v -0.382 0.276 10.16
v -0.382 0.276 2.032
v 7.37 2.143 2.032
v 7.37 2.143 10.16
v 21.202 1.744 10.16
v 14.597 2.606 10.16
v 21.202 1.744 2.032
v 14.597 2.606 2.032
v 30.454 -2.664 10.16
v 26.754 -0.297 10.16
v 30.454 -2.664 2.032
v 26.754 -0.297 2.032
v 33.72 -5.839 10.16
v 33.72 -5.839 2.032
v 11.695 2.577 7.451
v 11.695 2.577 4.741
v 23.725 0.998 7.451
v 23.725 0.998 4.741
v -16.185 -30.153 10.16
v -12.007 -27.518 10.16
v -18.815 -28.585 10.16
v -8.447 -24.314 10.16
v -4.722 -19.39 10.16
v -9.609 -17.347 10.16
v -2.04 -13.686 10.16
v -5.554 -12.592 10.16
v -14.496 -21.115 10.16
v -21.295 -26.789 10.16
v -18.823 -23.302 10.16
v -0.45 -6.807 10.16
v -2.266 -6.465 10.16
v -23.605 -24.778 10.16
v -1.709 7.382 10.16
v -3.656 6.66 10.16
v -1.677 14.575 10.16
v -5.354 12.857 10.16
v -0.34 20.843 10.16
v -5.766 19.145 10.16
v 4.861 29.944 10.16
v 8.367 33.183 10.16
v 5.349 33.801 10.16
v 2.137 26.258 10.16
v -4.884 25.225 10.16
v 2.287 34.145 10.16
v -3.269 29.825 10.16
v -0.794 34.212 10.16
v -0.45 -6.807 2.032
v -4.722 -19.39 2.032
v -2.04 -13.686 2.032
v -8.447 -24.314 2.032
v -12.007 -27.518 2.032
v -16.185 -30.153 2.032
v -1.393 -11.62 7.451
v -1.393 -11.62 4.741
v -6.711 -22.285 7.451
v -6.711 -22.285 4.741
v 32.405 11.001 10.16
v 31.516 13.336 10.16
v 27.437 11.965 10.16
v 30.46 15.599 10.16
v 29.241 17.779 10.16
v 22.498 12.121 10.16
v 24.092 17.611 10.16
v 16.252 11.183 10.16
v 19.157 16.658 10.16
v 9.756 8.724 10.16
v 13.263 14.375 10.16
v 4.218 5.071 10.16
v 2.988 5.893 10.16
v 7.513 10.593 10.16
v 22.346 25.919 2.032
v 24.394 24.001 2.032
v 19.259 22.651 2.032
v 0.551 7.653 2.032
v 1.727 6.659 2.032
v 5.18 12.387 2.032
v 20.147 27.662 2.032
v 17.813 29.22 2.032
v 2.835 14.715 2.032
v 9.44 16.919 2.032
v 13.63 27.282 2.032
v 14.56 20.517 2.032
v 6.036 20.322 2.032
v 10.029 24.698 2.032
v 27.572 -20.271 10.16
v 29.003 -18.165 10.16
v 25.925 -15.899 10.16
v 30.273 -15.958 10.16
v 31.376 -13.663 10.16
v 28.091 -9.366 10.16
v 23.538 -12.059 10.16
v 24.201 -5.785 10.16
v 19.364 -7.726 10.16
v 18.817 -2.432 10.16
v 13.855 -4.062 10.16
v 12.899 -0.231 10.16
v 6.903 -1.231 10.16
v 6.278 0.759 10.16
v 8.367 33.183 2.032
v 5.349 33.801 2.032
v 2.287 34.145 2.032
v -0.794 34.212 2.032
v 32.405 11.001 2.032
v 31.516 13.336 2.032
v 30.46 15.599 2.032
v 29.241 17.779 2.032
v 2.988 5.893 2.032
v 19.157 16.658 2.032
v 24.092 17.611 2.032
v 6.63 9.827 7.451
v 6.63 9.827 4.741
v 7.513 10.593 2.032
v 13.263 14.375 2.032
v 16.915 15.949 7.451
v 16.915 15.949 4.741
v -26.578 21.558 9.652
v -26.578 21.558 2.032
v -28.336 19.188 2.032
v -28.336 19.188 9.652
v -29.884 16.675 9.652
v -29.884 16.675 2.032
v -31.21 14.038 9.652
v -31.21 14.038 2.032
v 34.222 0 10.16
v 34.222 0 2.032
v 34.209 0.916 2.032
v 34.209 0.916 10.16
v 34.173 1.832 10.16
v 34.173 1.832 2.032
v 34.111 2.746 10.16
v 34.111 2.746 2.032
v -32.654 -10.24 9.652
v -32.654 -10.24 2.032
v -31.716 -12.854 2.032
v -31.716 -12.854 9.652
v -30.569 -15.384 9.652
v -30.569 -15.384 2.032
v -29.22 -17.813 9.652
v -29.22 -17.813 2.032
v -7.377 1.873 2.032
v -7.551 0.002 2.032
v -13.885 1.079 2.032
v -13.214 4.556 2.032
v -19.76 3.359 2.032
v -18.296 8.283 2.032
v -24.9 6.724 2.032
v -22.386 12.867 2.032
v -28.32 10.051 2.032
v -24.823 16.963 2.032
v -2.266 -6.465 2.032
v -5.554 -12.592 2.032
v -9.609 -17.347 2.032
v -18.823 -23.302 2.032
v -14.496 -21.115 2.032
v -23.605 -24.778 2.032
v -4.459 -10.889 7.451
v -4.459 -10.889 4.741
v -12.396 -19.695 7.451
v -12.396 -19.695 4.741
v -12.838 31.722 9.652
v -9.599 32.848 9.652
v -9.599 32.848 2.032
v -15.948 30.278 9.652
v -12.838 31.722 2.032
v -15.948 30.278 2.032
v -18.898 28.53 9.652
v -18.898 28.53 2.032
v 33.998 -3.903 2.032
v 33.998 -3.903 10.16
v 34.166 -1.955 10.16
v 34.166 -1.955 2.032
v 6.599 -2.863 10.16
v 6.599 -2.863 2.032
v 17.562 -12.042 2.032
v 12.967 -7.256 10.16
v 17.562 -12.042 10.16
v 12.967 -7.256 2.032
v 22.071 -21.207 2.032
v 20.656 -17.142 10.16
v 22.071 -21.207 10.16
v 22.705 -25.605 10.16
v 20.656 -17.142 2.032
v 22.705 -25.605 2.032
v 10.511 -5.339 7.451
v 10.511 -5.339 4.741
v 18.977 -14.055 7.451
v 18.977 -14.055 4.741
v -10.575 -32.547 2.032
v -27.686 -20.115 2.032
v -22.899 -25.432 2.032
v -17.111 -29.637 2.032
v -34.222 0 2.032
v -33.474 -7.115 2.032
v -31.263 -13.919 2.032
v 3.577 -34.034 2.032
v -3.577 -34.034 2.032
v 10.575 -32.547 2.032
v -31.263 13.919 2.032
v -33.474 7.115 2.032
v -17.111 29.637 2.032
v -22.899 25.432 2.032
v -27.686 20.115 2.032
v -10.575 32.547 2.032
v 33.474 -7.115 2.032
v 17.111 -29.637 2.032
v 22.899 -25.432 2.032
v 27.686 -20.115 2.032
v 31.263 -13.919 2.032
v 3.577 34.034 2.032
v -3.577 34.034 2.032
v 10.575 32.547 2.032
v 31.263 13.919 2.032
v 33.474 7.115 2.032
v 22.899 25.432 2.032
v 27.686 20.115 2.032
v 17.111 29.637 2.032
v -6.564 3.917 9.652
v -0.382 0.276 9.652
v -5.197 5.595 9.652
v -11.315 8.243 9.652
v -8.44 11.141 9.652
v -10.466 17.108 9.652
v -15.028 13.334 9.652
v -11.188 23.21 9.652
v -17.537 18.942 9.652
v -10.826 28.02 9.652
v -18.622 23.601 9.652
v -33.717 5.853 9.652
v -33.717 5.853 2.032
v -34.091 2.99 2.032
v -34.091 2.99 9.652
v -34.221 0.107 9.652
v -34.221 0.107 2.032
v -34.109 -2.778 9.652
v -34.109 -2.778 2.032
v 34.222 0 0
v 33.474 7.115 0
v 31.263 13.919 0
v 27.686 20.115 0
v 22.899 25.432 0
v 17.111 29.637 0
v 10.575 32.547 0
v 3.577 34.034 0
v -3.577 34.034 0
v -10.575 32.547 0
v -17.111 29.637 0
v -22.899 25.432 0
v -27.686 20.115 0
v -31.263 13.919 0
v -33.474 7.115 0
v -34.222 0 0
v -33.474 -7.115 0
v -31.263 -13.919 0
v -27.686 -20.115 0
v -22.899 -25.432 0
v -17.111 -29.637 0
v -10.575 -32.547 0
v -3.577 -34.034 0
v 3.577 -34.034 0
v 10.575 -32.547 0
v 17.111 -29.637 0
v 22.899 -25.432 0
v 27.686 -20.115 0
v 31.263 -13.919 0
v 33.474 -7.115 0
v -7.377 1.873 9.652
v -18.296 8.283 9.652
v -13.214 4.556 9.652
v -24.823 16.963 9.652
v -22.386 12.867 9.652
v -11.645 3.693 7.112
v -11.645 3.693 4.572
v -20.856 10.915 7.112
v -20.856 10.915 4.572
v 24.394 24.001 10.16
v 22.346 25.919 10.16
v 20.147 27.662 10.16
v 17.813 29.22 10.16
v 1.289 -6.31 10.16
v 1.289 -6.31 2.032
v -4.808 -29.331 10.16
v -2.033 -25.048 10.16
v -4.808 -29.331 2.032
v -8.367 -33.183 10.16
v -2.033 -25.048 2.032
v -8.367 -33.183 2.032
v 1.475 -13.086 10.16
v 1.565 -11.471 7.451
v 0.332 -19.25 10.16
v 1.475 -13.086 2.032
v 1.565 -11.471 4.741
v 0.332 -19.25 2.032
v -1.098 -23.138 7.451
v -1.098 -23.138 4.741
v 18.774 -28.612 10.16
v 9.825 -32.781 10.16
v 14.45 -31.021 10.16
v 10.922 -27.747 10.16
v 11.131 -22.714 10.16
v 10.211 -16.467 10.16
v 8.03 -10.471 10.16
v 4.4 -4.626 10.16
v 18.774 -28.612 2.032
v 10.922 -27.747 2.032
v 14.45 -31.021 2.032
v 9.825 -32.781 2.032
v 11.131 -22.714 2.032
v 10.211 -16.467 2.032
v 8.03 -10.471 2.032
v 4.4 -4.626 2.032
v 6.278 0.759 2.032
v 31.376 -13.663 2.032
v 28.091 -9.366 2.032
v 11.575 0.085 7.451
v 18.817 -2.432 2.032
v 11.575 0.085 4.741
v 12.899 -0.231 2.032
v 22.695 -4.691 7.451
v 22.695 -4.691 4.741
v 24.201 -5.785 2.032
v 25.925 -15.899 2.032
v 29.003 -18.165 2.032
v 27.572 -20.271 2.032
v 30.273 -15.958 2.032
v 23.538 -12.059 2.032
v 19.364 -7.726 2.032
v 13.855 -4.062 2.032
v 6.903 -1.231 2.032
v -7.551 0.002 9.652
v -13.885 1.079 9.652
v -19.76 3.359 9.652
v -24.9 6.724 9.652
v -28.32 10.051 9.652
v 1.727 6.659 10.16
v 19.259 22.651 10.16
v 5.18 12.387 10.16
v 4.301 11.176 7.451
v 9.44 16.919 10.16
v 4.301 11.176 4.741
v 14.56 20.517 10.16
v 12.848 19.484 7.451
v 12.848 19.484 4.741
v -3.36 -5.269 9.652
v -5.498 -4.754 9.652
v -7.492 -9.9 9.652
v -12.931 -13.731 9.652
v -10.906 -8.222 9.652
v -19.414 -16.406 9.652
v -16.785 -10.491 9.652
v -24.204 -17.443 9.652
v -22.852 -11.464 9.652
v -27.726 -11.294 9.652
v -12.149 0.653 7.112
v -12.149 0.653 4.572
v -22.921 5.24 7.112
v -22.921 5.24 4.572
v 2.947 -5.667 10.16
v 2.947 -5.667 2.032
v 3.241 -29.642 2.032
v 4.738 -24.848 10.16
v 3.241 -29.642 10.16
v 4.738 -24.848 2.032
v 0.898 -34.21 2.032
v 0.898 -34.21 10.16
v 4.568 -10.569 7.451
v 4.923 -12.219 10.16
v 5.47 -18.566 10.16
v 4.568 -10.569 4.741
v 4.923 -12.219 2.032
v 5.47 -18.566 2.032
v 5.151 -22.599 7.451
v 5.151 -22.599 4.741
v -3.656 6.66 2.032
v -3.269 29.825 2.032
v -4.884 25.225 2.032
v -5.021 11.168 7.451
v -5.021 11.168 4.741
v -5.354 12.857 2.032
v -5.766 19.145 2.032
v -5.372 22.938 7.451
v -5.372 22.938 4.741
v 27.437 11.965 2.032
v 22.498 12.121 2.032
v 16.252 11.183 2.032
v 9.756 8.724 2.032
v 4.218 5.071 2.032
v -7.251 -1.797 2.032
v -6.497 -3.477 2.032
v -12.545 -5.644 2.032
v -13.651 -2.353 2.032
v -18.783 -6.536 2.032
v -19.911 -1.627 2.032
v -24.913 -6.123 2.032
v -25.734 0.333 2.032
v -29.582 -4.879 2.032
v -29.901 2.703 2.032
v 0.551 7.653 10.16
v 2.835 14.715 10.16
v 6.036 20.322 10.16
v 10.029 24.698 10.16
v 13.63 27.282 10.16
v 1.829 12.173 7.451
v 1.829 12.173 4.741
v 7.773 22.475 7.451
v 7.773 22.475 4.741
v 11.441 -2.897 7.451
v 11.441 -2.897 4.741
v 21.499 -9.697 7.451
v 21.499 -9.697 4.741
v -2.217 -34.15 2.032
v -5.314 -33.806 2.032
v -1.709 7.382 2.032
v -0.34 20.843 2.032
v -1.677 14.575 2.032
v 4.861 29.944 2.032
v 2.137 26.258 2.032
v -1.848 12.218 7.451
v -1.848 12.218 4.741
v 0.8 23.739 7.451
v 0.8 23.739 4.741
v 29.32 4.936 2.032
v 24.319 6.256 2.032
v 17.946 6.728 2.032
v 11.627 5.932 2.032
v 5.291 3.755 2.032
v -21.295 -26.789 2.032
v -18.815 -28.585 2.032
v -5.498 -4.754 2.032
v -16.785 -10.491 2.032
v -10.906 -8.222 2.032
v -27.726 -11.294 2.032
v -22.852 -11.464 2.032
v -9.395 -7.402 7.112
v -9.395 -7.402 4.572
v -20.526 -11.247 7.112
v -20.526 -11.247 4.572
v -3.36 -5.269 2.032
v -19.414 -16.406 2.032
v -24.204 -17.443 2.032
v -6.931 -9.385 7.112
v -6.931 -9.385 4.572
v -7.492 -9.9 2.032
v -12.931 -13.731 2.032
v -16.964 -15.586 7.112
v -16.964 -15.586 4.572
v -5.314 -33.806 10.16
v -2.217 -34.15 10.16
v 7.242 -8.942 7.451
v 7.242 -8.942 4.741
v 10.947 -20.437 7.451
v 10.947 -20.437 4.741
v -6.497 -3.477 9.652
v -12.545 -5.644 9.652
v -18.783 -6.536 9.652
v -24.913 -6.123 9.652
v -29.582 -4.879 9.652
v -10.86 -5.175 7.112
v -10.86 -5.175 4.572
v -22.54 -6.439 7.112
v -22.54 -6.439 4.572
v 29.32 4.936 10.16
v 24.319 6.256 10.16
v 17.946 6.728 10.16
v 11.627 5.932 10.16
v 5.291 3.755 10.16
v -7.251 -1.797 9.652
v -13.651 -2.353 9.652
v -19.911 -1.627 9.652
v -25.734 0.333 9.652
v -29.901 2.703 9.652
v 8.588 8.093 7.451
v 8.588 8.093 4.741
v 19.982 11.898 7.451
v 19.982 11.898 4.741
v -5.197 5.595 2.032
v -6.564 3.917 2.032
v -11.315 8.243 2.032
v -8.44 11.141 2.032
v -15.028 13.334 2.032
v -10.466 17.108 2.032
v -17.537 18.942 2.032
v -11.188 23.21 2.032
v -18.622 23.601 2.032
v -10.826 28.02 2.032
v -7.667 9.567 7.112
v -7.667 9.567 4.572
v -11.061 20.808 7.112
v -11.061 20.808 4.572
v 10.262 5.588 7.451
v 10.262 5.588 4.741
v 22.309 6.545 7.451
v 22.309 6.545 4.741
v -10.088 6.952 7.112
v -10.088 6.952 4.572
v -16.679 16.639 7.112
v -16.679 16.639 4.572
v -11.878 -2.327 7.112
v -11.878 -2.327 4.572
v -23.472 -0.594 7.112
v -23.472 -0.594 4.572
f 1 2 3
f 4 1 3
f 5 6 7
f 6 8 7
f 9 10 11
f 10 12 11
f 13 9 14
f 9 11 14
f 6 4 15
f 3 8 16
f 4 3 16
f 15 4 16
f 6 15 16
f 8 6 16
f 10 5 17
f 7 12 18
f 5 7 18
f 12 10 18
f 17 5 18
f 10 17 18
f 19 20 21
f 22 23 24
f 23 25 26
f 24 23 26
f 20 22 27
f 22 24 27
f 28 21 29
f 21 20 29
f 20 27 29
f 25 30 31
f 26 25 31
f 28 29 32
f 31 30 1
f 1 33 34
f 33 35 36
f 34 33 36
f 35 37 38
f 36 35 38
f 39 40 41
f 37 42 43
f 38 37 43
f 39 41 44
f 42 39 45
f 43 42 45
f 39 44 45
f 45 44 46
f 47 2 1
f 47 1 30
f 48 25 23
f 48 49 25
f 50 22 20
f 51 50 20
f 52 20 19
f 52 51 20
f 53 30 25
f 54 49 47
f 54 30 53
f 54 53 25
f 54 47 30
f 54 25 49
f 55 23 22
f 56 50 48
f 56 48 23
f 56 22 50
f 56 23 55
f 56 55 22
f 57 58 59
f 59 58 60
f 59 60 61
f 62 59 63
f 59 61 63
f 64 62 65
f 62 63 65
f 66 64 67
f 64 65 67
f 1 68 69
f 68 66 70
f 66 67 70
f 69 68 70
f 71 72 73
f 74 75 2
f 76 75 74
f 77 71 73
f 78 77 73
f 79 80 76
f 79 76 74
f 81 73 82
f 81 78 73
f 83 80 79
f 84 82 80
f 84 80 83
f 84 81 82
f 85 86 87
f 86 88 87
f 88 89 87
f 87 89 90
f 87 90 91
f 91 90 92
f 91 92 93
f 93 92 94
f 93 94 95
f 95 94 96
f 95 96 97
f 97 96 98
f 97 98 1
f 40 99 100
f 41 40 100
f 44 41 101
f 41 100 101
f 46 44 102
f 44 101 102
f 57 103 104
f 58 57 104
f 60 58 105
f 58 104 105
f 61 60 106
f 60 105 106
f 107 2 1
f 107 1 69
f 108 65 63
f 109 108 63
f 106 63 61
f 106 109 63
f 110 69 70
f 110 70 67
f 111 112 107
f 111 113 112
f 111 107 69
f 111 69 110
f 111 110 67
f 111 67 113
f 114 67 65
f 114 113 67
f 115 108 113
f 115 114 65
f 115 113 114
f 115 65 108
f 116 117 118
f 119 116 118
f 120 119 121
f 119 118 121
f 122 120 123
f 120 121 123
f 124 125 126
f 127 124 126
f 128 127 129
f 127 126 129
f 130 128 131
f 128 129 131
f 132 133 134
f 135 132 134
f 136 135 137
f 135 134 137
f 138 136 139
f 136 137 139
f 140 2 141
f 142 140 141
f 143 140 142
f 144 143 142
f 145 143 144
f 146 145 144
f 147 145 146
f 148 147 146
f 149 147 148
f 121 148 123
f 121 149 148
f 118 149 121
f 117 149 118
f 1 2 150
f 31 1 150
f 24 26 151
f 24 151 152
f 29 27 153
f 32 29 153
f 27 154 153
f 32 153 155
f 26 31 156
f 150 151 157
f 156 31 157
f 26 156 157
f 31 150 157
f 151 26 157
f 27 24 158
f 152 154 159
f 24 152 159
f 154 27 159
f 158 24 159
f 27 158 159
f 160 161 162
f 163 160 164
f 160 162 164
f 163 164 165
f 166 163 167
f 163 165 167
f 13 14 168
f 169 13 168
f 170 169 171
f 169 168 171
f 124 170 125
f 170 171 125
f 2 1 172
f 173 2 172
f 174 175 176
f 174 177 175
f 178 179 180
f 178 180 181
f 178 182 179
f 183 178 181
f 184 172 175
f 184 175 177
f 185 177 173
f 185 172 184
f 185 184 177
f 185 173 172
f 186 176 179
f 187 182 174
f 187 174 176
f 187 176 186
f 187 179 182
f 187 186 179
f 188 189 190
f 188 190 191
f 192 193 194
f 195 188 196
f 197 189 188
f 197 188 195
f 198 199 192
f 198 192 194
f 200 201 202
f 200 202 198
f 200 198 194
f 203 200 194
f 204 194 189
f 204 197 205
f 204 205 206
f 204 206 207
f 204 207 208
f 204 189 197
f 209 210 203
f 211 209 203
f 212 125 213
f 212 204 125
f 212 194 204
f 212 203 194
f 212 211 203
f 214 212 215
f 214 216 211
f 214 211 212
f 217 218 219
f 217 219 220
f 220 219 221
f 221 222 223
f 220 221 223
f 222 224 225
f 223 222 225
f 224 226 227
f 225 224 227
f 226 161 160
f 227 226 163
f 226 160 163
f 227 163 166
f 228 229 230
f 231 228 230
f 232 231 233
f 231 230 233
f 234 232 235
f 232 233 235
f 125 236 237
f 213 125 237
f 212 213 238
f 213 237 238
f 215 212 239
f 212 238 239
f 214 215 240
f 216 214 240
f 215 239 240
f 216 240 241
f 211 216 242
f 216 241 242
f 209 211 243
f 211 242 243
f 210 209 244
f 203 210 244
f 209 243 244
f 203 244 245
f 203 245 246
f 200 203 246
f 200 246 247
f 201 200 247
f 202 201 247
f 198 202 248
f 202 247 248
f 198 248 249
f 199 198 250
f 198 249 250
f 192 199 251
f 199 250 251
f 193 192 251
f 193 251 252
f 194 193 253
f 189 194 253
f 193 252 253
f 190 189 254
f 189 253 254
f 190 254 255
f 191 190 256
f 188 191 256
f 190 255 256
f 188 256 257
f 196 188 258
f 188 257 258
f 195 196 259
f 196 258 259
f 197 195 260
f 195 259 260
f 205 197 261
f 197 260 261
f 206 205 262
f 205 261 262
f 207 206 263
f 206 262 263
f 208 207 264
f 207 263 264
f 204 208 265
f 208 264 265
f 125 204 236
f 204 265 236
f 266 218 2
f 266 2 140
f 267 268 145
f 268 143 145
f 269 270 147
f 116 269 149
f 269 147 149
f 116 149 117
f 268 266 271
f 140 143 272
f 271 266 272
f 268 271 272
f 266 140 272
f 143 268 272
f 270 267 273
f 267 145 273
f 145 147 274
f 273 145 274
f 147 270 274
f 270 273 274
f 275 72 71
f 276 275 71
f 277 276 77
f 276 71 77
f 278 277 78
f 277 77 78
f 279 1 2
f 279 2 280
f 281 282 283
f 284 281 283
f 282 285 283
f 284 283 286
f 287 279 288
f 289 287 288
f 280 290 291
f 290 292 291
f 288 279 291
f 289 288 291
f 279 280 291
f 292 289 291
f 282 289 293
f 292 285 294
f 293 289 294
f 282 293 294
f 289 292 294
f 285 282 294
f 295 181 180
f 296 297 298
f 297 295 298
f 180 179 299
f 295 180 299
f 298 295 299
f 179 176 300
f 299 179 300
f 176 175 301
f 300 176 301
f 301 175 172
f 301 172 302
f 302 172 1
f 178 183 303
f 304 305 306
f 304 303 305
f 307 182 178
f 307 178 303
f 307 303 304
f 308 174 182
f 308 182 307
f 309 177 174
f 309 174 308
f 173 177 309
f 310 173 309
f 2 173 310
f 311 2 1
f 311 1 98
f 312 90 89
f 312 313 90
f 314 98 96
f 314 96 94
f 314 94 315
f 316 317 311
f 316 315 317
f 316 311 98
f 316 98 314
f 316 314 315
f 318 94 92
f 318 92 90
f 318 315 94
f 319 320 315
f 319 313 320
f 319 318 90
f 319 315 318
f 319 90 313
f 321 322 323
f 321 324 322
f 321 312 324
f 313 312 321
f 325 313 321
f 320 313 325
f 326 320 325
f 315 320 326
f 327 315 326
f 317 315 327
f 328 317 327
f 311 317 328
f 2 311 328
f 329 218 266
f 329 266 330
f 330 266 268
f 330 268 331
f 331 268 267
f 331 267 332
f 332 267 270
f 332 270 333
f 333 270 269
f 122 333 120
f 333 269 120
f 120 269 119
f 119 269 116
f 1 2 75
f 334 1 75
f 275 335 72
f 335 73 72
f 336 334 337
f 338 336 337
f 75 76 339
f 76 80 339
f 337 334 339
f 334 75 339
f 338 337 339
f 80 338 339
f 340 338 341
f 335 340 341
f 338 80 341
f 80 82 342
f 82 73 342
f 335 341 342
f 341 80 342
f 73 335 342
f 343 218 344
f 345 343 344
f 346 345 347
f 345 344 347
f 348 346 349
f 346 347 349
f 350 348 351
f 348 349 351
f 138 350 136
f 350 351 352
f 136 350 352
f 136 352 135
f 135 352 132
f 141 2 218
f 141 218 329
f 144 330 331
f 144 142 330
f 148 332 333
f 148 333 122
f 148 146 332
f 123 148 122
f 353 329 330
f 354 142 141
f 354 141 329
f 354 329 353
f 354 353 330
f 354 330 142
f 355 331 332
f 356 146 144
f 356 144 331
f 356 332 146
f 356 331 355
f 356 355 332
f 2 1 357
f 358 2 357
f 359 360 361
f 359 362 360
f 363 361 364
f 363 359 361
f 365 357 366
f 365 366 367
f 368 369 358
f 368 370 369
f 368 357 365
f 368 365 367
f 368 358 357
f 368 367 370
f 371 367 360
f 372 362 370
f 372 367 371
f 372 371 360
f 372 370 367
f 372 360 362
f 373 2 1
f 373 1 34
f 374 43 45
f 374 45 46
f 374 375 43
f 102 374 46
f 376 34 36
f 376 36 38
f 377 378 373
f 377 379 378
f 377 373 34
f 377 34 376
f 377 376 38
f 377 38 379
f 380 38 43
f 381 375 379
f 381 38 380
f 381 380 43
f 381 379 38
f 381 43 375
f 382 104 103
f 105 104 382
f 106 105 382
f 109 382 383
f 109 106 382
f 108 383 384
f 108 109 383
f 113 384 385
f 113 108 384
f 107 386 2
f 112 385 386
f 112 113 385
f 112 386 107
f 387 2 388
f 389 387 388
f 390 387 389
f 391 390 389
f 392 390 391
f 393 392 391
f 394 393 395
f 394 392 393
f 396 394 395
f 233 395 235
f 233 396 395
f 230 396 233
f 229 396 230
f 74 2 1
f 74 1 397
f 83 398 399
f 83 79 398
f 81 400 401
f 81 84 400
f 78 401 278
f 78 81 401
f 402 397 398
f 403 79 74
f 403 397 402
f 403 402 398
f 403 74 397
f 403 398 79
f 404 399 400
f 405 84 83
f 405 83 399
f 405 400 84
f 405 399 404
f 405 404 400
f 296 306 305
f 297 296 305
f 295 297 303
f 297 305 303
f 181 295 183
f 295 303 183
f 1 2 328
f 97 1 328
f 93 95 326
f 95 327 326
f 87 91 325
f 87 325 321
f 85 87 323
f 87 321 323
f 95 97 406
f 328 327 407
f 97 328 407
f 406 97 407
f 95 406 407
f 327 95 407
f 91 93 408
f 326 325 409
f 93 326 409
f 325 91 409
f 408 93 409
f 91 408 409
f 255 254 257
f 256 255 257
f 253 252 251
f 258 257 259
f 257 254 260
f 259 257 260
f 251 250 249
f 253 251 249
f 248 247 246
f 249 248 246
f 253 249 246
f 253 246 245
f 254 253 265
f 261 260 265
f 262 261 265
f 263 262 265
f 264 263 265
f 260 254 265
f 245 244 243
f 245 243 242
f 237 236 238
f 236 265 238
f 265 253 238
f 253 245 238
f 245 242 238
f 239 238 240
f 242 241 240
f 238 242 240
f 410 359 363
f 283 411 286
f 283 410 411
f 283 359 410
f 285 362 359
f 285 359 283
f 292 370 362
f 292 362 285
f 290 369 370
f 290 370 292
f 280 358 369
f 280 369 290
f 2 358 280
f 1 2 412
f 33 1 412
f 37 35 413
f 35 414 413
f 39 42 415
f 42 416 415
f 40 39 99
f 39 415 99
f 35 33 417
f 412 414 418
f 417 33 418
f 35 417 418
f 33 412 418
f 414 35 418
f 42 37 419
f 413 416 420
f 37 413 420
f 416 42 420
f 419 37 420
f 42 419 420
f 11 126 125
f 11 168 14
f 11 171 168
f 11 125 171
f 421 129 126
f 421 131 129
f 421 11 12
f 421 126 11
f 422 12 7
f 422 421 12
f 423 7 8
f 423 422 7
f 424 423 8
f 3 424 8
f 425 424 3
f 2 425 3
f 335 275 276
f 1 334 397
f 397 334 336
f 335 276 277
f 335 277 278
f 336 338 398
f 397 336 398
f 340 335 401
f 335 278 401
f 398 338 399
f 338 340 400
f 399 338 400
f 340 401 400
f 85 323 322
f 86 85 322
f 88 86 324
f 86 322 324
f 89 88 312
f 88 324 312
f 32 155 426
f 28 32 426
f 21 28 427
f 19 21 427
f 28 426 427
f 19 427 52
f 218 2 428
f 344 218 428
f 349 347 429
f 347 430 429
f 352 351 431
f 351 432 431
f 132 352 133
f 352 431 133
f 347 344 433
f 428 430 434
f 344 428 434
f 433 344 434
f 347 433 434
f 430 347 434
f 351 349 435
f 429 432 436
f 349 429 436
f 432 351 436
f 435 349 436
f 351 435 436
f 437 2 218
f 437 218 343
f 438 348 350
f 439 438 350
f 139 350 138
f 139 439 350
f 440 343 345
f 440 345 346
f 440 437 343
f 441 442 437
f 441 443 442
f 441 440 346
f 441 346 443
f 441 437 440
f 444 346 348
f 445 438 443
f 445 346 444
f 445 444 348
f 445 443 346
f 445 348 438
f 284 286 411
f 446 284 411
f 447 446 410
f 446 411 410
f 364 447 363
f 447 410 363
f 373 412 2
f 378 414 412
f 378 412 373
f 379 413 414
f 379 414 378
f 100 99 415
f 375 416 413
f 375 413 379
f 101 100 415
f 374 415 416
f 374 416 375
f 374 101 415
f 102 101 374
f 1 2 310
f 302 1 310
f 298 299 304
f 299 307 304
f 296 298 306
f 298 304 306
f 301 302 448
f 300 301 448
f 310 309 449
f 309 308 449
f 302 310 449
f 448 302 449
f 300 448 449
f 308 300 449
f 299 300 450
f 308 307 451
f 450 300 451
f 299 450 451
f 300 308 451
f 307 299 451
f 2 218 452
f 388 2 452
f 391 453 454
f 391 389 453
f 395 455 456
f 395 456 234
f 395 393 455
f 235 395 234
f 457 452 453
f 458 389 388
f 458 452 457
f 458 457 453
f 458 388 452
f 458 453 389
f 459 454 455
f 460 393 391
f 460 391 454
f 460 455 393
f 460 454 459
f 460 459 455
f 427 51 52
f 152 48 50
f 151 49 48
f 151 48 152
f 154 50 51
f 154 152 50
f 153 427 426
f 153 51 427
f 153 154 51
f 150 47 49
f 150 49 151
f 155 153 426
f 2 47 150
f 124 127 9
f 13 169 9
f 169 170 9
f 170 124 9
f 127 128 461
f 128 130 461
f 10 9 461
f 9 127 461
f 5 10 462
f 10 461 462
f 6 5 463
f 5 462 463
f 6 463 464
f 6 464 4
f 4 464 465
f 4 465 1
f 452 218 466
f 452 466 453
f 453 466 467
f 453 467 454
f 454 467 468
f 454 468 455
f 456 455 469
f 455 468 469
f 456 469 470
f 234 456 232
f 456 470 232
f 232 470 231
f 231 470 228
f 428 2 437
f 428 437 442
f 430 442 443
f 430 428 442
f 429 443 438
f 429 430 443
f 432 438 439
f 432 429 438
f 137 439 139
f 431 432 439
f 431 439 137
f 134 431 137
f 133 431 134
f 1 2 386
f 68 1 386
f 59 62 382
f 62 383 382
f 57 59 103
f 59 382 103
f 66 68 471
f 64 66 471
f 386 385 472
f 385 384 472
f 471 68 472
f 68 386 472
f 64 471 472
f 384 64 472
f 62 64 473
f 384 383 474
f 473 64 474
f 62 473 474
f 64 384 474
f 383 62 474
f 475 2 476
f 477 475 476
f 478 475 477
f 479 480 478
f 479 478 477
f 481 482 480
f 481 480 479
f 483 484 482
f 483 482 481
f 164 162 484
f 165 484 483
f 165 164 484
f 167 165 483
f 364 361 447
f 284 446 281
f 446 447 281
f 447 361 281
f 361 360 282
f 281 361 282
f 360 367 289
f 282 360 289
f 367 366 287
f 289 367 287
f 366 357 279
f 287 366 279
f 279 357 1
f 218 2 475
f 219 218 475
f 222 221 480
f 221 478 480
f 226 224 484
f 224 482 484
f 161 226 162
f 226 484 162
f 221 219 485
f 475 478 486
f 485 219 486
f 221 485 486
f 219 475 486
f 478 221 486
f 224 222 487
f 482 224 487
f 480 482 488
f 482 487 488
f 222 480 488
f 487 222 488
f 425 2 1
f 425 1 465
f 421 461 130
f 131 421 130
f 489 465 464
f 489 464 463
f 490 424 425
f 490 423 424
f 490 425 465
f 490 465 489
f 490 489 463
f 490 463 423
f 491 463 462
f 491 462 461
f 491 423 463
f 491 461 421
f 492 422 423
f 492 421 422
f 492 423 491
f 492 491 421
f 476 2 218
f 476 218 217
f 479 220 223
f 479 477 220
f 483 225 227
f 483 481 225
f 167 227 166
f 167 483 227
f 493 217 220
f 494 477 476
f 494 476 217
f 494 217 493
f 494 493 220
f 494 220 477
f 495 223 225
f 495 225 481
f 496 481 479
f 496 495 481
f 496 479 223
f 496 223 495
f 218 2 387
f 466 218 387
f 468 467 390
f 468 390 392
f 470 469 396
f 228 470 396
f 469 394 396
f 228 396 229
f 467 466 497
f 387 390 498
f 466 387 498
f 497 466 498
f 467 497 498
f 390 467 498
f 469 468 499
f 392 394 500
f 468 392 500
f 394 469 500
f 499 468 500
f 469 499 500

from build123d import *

# Parameters (mm, degrees)
F0_R     = 34.2215996358
F1_DEPTH = 2.032
F3_DEPTH = 7.62
F4_DEPTH = 8.128


with BuildPart() as f1:
    # F0 (on Top) → F1 (new body)
    with BuildSketch(Plane.XY):
        Circle(F0_R)
    extrude(amount=F1_DEPTH)


with BuildPart() as f3:
    # F2 (on face) → F3 (new body)
    with BuildSketch(Plane.XY.offset(2.032)):
        with BuildLine():
            add(Edge.make_bspline(
                [(-0.3817611553, 0.2762220522), (-9.8229269799, -7.0229845844), (-23.0317515902, -9.1478075381), (-34.1086866499, -2.7776566832)],
                knots=[0, 0, 0, 0, 33.8410269735, 33.8410269735, 33.8410269735, 33.8410269735], degree=3))
            add(Edge.make_bspline(
                [(-0.3817611553, 0.2762220522), (-11.3469740052, -4.3691175462), (-24.6286084385, -3.076460801), (-33.7174154576, 5.8526725941)],
                knots=[0, 0, 0, 0, 33.7697886593, 33.7697886593, 33.7697886593, 33.7697886593], degree=3))
            ThreePointArc((-33.7174154576, 5.8526725941), (-34.1864838442, 1.5499045131), (-34.1086866499, -2.7776566832))
        make_face()
    extrude(amount=F3_DEPTH)


with BuildPart() as f3b:
    # F2 (on face) → F3, piece 2 (new body)
    with BuildSketch(Plane.XY.offset(2.032)):
        with BuildLine():
            add(Edge.make_bspline(
                [(-0.3817611553, 0.2762220522), (-12.149506396, -1.451750886), (-24.6595885941, 3.1349126352), (-31.209655543, 14.0383504202)],
                knots=[0, 0, 0, 0, 33.7281679226, 33.7281679226, 33.7281679226, 33.7281679226], degree=3))
            add(Edge.make_bspline(
                [(-0.3817611553, 0.2762220522), (-12.1912553322, 1.6614410134), (-23.0791894134, 9.3338814424), (-26.5780348787, 21.5575031861)],
                knots=[0, 0, 0, 0, 33.718303757, 33.718303757, 33.718303757, 33.718303757], degree=3))
            ThreePointArc((-26.5780348787, 21.5575031861), (-29.1374107574, 17.9479574321), (-31.209655543, 14.0383504202))
        make_face()
    extrude(amount=F3_DEPTH)


with BuildPart() as f3c:
    # F2 (on face) → F3, piece 3 (new body)
    with BuildSketch(Plane.XY.offset(2.032)):
        with BuildLine():
            add(Edge.make_bspline(
                [(-0.3817611553, 0.2762220522), (-11.2268992954, 5.1788199302), (-19.2837011166, 15.8048513984), (-18.8984173579, 28.5301192251)],
                knots=[0, 0, 0, 0, 33.7504252176, 33.7504252176, 33.7504252176, 33.7504252176], degree=3))
            add(Edge.make_bspline(
                [(-0.3817611553, 0.2762220522), (-9.2903550793, 8.2085192991), (-13.8106843451, 20.7924909339), (-9.598690233, 32.8478770614)],
                knots=[0, 0, 0, 0, 33.8256201476, 33.8256201476, 33.8256201476, 33.8256201476], degree=3))
            ThreePointArc((-9.598690233, 32.8478770614), (-14.4111777258, 31.0392628486), (-18.8984173579, 28.5301192251))
        make_face()
    extrude(amount=F3_DEPTH)


with BuildPart() as f3d:
    # F2 (on face) → F3, piece 4 (new body)
    with BuildSketch(Plane.XY.offset(2.032)):
        with BuildLine():
            add(Edge.make_bspline(
                [(-0.3817611553, 0.2762220522), (-4.7698827505, -10.9447565523), (-16.2723124598, -17.744408223), (-29.2200601048, -17.8130842109)],
                knots=[0, 0, 0, 0, 34.0421868771, 34.0421868771, 34.0421868771, 34.0421868771], degree=3))
            add(Edge.make_bspline(
                [(-0.3817611553, 0.2762220522), (-7.9630895822, -8.9779186328), (-20.4008060987, -14.0142782596), (-32.6537965984, -10.2395043504)],
                knots=[0, 0, 0, 0, 33.9242868068, 33.9242868068, 33.9242868068, 33.9242868068], degree=3))
            ThreePointArc((-32.6537965984, -10.2395043504), (-31.1678249772, -14.1309790115), (-29.2200601048, -17.8130842109))
        make_face()
    extrude(amount=F3_DEPTH)


with BuildPart() as f4:
    # F2 (on face) → F4 (new body)
    with BuildSketch(Plane.XY.offset(2.032)):
        with BuildLine():
            add(Edge.make_bspline(
                [(-0.3817611553, 0.2762220522), (0.082940128, 12.3157413404), (5.6042566129, 24.9081220199), (17.8131157398, 29.2200408842)],
                knots=[0, 0, 0, 0, 34.1876906767, 34.1876906767, 34.1876906767, 34.1876906767], degree=3))
            add(Edge.make_bspline(
                [(-0.3817611553, 0.2762220522), (2.0794716343, 12.070640441), (11.638023001, 21.7803036433), (24.3941047373, 24.0009486416)],
                knots=[0, 0, 0, 0, 34.3031512033, 34.3031512033, 34.3031512033, 34.3031512033], degree=3))
            ThreePointArc((24.3941047373, 24.0009486416), (21.2643385991, 26.813164408), (17.8131157398, 29.2200408842))
        make_face()
    extrude(amount=F4_DEPTH)


with BuildPart() as f4b:
    # F2 (on face) → F4, piece 2 (new body)
    with BuildSketch(Plane.XY.offset(2.032)):
        with BuildLine():
            add(Edge.make_bspline(
                [(-0.3817611553, 0.2762220522), (-6.9521720731, 10.2719382831), (-8.0492913603, 23.6439437008), (-0.7937078722, 34.2123940911)],
                knots=[0, 0, 0, 0, 33.9206103455, 33.9206103455, 33.9206103455, 33.9206103455], degree=3))
            add(Edge.make_bspline(
                [(-0.3817611553, 0.2762220522), (-3.6369075218, 11.8766528247), (-1.927379488, 25.3299783042), (8.3672860592, 33.182923404)],
                knots=[0, 0, 0, 0, 34.0499166081, 34.0499166081, 34.0499166081, 34.0499166081], degree=3))
            ThreePointArc((8.3672860592, 33.182923404), (3.8216127633, 34.0075455968), (-0.7937078722, 34.2123940911))
        make_face()
    extrude(amount=F4_DEPTH)


with BuildPart() as f4c:
    # F2 (on face) → F4, piece 3 (new body)
    with BuildSketch(Plane.XY.offset(2.032)):
        with BuildLine():
            add(Edge.make_bspline(
                [(-0.3817611553, 0.2762220522), (4.5812652267, 11.2550353353), (16.3066018252, 18.3810098079), (29.2405489712, 17.7794313041)],
                knots=[0, 0, 0, 0, 34.407028226, 34.407028226, 34.407028226, 34.407028226], degree=3))
            add(Edge.make_bspline(
                [(-0.3817611553, 0.2762220522), (6.9110119386, 9.866917156), (19.933253013, 14.480576699), (32.4050155829, 11.0014929305)],
                knots=[0, 0, 0, 0, 34.4964369798, 34.4964369798, 34.4964369798, 34.4964369798], degree=3))
            ThreePointArc((32.4050155829, 11.0014929305), (31.0085313978, 14.4771841939), (29.2405489712, 17.7794313041))
        make_face()
    extrude(amount=F4_DEPTH)


with BuildPart() as f4d:
    # F2 (on face) → F4, piece 4 (new body)
    with BuildSketch(Plane.XY.offset(2.032)):
        with BuildLine():
            add(Edge.make_bspline(
                [(-0.3817611553, 0.2762220522), (9.0112285915, 7.6321928641), (22.9814035401, 9.0562104119), (34.1112441304, 2.7460709217)],
                knots=[0, 0, 0, 0, 34.5552390972, 34.5552390972, 34.5552390972, 34.5552390972], degree=3))
            add(Edge.make_bspline(
                [(-0.3817611553, 0.2762220522), (11.0574133137, 4.0592445794), (25.403553133, 4.0849762887), (33.7197465731, -5.8392270616)],
                knots=[0, 0, 0, 0, 34.6455126563, 34.6455126563, 34.6455126563, 34.6455126563], degree=3))
            ThreePointArc((33.7197465731, -5.8392270616), (34.0959055363, -2.930376647), (34.2215996358, 0))
            ThreePointArc((34.2215996358, 0), (34.1939996296, 1.3741437193), (34.1112441304, 2.7460709217))
        make_face()
    extrude(amount=F4_DEPTH)


with BuildPart() as f4e:
    # F2 (on face) → F4, piece 5 (new body)
    with BuildSketch(Plane.XY.offset(2.032)):
        with BuildLine():
            add(Edge.make_bspline(
                [(-0.3817611553, 0.2762220522), (11.4582311751, 2.5079374438), (24.4499826823, -2.7230475612), (31.375805733, -13.662968061)],
                knots=[0, 0, 0, 0, 34.6820425534, 34.6820425534, 34.6820425534, 34.6820425534], degree=3))
            add(Edge.make_bspline(
                [(-0.3817611553, 0.2762220522), (11.5841697027, -1.1317803185), (24.2313613727, -7.7612188367), (27.5719625485, -20.2707859457)],
                knots=[0, 0, 0, 0, 34.6927976181, 34.6927976181, 34.6927976181, 34.6927976181], degree=3))
            ThreePointArc((27.5719625485, -20.2707859457), (29.6584837887, -17.0731432662), (31.375805733, -13.662968061))
        make_face()
    extrude(amount=F4_DEPTH)


with BuildPart() as f4f:
    # F2 (on face) → F4, piece 6 (new body)
    with BuildSketch(Plane.XY.offset(2.032)):
        with BuildLine():
            add(Edge.make_bspline(
                [(-0.3817611553, 0.2762220522), (10.9548271557, -3.6994776759), (22.116637971, -12.7277303702), (22.7047371631, -25.6049368674)],
                knots=[0, 0, 0, 0, 34.6680932581, 34.6680932581, 34.6680932581, 34.6680932581], degree=3))
            add(Edge.make_bspline(
                [(-0.3817611553, 0.2762220522), (8.8992981296, -7.3271590703), (13.6641874946, -20.4878318195), (9.8246859974, -32.7809918502)],
                knots=[0, 0, 0, 0, 34.5853468499, 34.5853468499, 34.5853468499, 34.5853468499], degree=3))
            ThreePointArc((9.8246859974, -32.7809918502), (16.6557732954, -29.8948674117), (22.7047371631, -25.6049368674))
        make_face()
    extrude(amount=F4_DEPTH)


with BuildPart() as f4g:
    # F2 (on face) → F4, piece 7 (new body)
    with BuildSketch(Plane.XY.offset(2.032)):
        with BuildLine():
            add(Edge.make_bspline(
                [(-0.3817611553, 0.2762220522), (6.5952103219, -9.4424145058), (7.7242192428, -23.3428196088), (0.8982999443, -34.2098076411)],
                knots=[0, 0, 0, 0, 34.4906845206, 34.4906845206, 34.4906845206, 34.4906845206], degree=3))
            add(Edge.make_bspline(
                [(-0.3817611553, 0.2762220522), (3.8720425566, -10.9963608797), (1.2037657243, -24.4626193395), (-8.3672962496, -33.1829208344)],
                knots=[0, 0, 0, 0, 34.3988809912, 34.3988809912, 34.3988809912, 34.3988809912], degree=3))
            ThreePointArc((-8.3672962496, -33.1829208344), (-3.7696287059, -34.0133471016), (0.8982999443, -34.2098076411))
        make_face()
    extrude(amount=F4_DEPTH)


with BuildPart() as f4h:
    # F2 (on face) → F4, piece 8 (new body)
    with BuildSketch(Plane.XY.offset(2.032)):
        with BuildLine():
            add(Edge.make_bspline(
                [(-0.3817611553, 0.2762220522), (0.8095385597, -11.7132223455), (-4.682651348, -24.2065817136), (-16.1845673995, -30.1525730199)],
                knots=[0, 0, 0, 0, 34.2876108052, 34.2876108052, 34.2876108052, 34.2876108052], degree=3))
            add(Edge.make_bspline(
                [(-0.3817611553, 0.2762220522), (-2.334150544, -11.6130229891), (-10.9558298804, -22.0112002609), (-23.6047634385, -24.7776718972)],
                knots=[0, 0, 0, 0, 34.1614612841, 34.1614612841, 34.1614612841, 34.1614612841], degree=3))
            ThreePointArc((-23.6047634385, -24.7776718972), (-20.0753605859, -27.7145770124), (-16.1845673995, -30.1525730199))
        make_face()
    extrude(amount=F4_DEPTH)


solid = Compound([f1.part, f3.part, f3b.part, f3c.part, f3d.part, f4.part, f4b.part, f4c.part, f4d.part, f4e.part, f4f.part, f4g.part, f4h.part])
